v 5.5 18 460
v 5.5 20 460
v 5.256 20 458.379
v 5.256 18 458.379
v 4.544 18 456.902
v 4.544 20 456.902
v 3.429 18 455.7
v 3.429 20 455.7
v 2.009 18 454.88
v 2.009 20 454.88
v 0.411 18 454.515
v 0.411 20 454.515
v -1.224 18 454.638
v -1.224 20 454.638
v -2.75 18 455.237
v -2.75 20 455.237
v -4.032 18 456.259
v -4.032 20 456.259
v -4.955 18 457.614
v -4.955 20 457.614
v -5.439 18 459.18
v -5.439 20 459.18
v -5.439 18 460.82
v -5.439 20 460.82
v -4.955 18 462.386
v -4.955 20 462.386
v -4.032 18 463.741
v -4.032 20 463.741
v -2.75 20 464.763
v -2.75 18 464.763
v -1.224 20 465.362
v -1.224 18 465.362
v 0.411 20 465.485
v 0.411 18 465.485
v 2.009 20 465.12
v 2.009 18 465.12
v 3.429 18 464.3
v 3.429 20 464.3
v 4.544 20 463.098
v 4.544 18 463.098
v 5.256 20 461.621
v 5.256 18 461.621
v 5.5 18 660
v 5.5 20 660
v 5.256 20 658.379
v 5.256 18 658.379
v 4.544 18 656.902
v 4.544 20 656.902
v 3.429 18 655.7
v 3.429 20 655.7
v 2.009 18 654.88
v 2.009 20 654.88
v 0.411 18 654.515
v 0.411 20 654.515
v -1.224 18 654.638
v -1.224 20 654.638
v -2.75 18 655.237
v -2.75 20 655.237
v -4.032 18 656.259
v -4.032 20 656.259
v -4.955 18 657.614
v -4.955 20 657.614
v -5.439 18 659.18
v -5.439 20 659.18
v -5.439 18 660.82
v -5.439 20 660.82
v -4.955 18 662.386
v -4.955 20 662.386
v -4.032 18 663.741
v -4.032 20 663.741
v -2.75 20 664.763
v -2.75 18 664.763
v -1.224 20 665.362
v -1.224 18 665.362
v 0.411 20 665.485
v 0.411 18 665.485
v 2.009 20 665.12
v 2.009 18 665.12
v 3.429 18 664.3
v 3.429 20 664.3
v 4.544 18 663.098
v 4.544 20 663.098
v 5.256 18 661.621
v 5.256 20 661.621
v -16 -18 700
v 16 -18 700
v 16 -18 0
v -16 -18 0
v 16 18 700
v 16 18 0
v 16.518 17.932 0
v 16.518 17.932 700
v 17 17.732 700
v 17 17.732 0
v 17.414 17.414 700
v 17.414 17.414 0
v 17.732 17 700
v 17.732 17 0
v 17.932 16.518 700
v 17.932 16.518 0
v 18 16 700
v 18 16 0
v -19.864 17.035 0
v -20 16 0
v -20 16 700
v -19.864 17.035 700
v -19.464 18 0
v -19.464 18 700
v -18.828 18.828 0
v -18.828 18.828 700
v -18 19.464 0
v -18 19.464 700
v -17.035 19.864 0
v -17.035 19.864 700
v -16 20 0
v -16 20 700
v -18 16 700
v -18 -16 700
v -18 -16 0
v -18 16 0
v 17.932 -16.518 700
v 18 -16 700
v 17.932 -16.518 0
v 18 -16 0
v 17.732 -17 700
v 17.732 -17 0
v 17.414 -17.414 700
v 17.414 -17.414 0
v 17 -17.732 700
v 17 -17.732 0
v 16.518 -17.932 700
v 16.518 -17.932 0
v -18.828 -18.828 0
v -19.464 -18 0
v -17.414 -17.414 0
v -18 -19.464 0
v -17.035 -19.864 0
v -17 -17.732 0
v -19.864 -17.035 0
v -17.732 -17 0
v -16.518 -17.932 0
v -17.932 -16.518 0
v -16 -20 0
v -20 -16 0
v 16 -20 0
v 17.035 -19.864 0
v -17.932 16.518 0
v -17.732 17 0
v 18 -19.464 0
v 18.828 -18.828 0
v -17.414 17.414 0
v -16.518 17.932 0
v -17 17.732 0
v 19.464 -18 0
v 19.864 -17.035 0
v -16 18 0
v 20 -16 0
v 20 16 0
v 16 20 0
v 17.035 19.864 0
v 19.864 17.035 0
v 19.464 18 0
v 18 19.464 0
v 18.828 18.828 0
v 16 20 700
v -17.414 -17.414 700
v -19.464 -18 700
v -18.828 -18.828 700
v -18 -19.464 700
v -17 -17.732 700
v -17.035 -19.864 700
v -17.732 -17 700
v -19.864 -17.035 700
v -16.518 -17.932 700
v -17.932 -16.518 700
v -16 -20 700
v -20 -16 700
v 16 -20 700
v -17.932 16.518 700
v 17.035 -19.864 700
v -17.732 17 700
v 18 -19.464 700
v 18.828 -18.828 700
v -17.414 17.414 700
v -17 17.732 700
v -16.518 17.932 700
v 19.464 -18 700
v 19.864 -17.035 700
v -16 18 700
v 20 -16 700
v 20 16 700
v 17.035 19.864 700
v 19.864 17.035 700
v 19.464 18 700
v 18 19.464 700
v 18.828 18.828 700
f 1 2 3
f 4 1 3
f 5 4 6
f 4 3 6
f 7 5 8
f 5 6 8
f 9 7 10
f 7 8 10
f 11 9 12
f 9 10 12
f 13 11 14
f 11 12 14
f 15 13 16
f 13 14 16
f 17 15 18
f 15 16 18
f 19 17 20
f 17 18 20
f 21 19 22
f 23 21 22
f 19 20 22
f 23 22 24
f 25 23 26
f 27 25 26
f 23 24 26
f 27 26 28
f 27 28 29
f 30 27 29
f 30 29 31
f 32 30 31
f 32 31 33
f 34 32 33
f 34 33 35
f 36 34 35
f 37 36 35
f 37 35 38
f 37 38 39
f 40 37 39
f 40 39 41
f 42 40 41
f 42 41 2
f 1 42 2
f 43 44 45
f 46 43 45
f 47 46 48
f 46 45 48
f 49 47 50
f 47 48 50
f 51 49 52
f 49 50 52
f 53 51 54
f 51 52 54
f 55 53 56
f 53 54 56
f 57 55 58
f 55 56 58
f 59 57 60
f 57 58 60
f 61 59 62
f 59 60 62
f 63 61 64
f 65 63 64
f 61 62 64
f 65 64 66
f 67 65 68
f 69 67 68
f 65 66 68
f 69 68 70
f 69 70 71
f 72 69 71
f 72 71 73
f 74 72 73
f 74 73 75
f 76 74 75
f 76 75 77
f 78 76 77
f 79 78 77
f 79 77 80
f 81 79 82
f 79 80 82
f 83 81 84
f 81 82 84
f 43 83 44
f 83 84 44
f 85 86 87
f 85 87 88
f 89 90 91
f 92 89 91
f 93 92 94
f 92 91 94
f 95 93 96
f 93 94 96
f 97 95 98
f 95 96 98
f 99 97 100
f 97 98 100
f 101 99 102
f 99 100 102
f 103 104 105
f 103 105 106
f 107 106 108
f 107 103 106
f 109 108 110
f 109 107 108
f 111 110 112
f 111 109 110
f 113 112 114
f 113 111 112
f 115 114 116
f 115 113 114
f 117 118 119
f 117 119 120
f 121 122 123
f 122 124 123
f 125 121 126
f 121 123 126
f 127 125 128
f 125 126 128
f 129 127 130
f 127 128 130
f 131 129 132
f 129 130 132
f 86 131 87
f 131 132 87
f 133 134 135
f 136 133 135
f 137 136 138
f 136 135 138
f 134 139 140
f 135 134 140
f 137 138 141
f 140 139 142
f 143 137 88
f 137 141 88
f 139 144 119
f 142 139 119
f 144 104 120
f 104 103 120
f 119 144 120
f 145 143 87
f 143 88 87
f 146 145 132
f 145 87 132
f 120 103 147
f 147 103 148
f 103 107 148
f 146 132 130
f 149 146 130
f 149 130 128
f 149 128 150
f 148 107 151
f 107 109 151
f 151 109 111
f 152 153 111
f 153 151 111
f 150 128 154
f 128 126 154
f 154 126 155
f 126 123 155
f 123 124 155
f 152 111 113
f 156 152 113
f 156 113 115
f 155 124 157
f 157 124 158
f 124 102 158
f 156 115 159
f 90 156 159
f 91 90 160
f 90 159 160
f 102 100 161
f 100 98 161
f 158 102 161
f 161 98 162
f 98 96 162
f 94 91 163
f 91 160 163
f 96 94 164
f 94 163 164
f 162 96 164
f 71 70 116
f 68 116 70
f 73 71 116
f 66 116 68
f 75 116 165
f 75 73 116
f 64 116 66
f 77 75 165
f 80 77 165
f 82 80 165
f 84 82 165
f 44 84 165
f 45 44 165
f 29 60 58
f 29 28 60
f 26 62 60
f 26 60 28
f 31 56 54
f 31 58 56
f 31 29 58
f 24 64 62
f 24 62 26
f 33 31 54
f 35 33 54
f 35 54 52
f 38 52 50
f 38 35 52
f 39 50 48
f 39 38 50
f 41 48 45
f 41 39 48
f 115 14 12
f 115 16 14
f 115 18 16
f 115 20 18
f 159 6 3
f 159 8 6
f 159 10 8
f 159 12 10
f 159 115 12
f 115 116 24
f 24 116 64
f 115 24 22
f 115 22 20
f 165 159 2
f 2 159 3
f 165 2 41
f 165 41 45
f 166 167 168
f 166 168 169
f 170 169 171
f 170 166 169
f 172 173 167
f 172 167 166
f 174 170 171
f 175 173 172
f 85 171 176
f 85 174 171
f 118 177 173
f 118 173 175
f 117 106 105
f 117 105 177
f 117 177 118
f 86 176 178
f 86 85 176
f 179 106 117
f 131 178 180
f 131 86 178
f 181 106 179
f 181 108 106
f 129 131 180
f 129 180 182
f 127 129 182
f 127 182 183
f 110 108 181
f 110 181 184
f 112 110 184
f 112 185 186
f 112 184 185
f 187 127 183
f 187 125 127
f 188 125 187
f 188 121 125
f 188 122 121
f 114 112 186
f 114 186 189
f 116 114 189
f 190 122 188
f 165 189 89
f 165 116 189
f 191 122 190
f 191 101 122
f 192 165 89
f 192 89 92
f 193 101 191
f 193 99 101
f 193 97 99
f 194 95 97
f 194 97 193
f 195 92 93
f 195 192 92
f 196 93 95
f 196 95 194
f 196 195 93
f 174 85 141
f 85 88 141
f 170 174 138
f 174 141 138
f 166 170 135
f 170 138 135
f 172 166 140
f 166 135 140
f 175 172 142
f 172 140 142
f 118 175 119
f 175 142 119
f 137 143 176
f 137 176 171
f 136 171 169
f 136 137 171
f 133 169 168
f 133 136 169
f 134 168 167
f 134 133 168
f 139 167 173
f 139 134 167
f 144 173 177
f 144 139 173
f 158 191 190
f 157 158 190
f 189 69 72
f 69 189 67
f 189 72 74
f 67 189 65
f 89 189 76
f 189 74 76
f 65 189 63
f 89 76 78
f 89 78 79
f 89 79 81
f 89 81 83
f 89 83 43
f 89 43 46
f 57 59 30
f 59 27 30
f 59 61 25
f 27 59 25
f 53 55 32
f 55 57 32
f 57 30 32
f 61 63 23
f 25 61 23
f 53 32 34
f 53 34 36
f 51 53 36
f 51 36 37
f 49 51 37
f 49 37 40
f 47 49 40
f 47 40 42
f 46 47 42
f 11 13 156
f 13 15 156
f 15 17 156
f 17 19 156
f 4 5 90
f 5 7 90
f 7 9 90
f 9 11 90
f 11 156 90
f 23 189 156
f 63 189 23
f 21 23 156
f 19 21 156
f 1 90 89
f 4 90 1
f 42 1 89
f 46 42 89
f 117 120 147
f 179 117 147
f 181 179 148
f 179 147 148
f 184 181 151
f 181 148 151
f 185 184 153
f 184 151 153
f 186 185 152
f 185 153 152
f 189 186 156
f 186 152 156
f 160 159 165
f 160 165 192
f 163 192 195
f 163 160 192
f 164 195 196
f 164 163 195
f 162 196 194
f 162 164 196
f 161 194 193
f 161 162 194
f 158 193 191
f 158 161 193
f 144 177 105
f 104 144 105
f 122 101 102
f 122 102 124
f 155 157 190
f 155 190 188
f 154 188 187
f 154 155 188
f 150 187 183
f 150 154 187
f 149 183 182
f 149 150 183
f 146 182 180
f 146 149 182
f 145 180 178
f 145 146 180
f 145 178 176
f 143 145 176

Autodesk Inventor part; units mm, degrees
ref_plane "YZ Plane" through (0, 0, 0) normal (1, 0, 0) x (0, 1, 0)
ref_plane "Start Plane" through (0, 0, 0) normal (0, 0, 1) x (1, 0, 0)
ref_plane "End Plane" through (0, 0, 700) normal (0, 0, 1) x (1, 0, 0)
sketch "Sketch" plane through (0, 0, 0) normal (0, 0, 1) x (1, 0, 0)
  line L0 (-20, -16) -> (-20, 16)
  line L1 (-16, 20) -> (16, 20)
  line L2 (20, 16) -> (20, -16)
  line L3 (16, -20) -> (-16, -20)
  arc A0 (-20, -16) -> (-16, -20) centre (-16, -16) ccw
  arc A1 (20, 16) -> (16, 20) centre (16, 16) ccw
  arc A2 (-16, 20) -> (-20, 16) centre (-16, 16) ccw
  arc A3 (16, -20) -> (20, -16) centre (16, -16) ccw
  arc A4 (-16, 18) -> (-18, 16) centre (-16, 16) ccw
  line L4 (-16, 18) -> (16, 18)
  arc A5 (18, 16) -> (16, 18) centre (16, 16) ccw
  line L5 (18, 16) -> (18, -16)
  arc A6 (16, -18) -> (18, -16) centre (16, -16) ccw
  line L6 (16, -18) -> (-16, -18)
  arc A7 (-18, -16) -> (-16, -18) centre (-16, -16) ccw
  line L7 (-18, -16) -> (-18, 16)
  line L8 (0, 29.1598) -> (0, -29.1598) construction
  line L9 (-29.1598, 0) -> (29.1598, 0) construction
  dimension "d7" = 4
  dimension "d9" = 40
  dimension "d11" = 40
  dimension "d12" = 2
  dimension "d15" = 20
  dimension "d16" = 20
extrude "Body" add sketch "Sketch" along normal up to surface (700 mm away) from surface at 0
sketch "Sketch3" plane through (0, 0, 0) normal (0, 0, 1) x (1, 0, 0)
  line L0 (0, 0) -> (10, 0)
ref_plane "Work Plane3" through (0, 0, 0) normal (0, -1, 0) x (1, 0, 0)
sketch "Sketch5" plane through (16, 20, 700) normal (0, 1, 0) x (1, 0, 0)
  line L0 (-32, 0) -> (0, 0) construction
  line L1 (0, 700) -> (0, 0) construction
  line L2 (-32, 700) -> (0, 700) projected
  line L3 (-32, 700) -> (-32, 0) construction
  circle A0 centre (-16, 40) radius 5.5
  circle A1 centre (-16, 240) radius 5.5
  point P0 (-16, 700)
  point P1 (-16, 0)
  dimension "d19" = 11
  dimension "d20" = 40
  dimension "d21" = 200
extrude "Extrusion2" cut sketch "Sketch5" against normal up to surface (2 mm away)
sketch "Sketch4" plane through (0, 0, 0) normal (0, -1, 0) x (1, 0, 0)
  line L0 (-2, 0) -> (12, 0) projected
  line L1 (-2, 700) -> (12, 700) projected
  dimension "d18" = 700
equation "\"d7\" = G_IR"
equation "\"d9\" = G_W"
equation "\"d11\" = G_H"
equation "\"d12\" = G_T"
equation "\"d15\" = 0.5 * d9"
equation "\"d16\" = 0.5 * d11"
equation "\"d3\" = G_L"
equation "\"G_W\" = 40"
equation "\"G_H\" = 40"
equation "\"G_T\" = 2"
equation "\"G_IR\" = 4"
equation "\"G_L\" = d18"
equation "\"G_OFFSET_START\" = 0"
equation "\"G_OFFSET_END\" = 0"
properties part number "ISO 10799-2 40x40x2 1714907750312" material "Stainless Steel"
